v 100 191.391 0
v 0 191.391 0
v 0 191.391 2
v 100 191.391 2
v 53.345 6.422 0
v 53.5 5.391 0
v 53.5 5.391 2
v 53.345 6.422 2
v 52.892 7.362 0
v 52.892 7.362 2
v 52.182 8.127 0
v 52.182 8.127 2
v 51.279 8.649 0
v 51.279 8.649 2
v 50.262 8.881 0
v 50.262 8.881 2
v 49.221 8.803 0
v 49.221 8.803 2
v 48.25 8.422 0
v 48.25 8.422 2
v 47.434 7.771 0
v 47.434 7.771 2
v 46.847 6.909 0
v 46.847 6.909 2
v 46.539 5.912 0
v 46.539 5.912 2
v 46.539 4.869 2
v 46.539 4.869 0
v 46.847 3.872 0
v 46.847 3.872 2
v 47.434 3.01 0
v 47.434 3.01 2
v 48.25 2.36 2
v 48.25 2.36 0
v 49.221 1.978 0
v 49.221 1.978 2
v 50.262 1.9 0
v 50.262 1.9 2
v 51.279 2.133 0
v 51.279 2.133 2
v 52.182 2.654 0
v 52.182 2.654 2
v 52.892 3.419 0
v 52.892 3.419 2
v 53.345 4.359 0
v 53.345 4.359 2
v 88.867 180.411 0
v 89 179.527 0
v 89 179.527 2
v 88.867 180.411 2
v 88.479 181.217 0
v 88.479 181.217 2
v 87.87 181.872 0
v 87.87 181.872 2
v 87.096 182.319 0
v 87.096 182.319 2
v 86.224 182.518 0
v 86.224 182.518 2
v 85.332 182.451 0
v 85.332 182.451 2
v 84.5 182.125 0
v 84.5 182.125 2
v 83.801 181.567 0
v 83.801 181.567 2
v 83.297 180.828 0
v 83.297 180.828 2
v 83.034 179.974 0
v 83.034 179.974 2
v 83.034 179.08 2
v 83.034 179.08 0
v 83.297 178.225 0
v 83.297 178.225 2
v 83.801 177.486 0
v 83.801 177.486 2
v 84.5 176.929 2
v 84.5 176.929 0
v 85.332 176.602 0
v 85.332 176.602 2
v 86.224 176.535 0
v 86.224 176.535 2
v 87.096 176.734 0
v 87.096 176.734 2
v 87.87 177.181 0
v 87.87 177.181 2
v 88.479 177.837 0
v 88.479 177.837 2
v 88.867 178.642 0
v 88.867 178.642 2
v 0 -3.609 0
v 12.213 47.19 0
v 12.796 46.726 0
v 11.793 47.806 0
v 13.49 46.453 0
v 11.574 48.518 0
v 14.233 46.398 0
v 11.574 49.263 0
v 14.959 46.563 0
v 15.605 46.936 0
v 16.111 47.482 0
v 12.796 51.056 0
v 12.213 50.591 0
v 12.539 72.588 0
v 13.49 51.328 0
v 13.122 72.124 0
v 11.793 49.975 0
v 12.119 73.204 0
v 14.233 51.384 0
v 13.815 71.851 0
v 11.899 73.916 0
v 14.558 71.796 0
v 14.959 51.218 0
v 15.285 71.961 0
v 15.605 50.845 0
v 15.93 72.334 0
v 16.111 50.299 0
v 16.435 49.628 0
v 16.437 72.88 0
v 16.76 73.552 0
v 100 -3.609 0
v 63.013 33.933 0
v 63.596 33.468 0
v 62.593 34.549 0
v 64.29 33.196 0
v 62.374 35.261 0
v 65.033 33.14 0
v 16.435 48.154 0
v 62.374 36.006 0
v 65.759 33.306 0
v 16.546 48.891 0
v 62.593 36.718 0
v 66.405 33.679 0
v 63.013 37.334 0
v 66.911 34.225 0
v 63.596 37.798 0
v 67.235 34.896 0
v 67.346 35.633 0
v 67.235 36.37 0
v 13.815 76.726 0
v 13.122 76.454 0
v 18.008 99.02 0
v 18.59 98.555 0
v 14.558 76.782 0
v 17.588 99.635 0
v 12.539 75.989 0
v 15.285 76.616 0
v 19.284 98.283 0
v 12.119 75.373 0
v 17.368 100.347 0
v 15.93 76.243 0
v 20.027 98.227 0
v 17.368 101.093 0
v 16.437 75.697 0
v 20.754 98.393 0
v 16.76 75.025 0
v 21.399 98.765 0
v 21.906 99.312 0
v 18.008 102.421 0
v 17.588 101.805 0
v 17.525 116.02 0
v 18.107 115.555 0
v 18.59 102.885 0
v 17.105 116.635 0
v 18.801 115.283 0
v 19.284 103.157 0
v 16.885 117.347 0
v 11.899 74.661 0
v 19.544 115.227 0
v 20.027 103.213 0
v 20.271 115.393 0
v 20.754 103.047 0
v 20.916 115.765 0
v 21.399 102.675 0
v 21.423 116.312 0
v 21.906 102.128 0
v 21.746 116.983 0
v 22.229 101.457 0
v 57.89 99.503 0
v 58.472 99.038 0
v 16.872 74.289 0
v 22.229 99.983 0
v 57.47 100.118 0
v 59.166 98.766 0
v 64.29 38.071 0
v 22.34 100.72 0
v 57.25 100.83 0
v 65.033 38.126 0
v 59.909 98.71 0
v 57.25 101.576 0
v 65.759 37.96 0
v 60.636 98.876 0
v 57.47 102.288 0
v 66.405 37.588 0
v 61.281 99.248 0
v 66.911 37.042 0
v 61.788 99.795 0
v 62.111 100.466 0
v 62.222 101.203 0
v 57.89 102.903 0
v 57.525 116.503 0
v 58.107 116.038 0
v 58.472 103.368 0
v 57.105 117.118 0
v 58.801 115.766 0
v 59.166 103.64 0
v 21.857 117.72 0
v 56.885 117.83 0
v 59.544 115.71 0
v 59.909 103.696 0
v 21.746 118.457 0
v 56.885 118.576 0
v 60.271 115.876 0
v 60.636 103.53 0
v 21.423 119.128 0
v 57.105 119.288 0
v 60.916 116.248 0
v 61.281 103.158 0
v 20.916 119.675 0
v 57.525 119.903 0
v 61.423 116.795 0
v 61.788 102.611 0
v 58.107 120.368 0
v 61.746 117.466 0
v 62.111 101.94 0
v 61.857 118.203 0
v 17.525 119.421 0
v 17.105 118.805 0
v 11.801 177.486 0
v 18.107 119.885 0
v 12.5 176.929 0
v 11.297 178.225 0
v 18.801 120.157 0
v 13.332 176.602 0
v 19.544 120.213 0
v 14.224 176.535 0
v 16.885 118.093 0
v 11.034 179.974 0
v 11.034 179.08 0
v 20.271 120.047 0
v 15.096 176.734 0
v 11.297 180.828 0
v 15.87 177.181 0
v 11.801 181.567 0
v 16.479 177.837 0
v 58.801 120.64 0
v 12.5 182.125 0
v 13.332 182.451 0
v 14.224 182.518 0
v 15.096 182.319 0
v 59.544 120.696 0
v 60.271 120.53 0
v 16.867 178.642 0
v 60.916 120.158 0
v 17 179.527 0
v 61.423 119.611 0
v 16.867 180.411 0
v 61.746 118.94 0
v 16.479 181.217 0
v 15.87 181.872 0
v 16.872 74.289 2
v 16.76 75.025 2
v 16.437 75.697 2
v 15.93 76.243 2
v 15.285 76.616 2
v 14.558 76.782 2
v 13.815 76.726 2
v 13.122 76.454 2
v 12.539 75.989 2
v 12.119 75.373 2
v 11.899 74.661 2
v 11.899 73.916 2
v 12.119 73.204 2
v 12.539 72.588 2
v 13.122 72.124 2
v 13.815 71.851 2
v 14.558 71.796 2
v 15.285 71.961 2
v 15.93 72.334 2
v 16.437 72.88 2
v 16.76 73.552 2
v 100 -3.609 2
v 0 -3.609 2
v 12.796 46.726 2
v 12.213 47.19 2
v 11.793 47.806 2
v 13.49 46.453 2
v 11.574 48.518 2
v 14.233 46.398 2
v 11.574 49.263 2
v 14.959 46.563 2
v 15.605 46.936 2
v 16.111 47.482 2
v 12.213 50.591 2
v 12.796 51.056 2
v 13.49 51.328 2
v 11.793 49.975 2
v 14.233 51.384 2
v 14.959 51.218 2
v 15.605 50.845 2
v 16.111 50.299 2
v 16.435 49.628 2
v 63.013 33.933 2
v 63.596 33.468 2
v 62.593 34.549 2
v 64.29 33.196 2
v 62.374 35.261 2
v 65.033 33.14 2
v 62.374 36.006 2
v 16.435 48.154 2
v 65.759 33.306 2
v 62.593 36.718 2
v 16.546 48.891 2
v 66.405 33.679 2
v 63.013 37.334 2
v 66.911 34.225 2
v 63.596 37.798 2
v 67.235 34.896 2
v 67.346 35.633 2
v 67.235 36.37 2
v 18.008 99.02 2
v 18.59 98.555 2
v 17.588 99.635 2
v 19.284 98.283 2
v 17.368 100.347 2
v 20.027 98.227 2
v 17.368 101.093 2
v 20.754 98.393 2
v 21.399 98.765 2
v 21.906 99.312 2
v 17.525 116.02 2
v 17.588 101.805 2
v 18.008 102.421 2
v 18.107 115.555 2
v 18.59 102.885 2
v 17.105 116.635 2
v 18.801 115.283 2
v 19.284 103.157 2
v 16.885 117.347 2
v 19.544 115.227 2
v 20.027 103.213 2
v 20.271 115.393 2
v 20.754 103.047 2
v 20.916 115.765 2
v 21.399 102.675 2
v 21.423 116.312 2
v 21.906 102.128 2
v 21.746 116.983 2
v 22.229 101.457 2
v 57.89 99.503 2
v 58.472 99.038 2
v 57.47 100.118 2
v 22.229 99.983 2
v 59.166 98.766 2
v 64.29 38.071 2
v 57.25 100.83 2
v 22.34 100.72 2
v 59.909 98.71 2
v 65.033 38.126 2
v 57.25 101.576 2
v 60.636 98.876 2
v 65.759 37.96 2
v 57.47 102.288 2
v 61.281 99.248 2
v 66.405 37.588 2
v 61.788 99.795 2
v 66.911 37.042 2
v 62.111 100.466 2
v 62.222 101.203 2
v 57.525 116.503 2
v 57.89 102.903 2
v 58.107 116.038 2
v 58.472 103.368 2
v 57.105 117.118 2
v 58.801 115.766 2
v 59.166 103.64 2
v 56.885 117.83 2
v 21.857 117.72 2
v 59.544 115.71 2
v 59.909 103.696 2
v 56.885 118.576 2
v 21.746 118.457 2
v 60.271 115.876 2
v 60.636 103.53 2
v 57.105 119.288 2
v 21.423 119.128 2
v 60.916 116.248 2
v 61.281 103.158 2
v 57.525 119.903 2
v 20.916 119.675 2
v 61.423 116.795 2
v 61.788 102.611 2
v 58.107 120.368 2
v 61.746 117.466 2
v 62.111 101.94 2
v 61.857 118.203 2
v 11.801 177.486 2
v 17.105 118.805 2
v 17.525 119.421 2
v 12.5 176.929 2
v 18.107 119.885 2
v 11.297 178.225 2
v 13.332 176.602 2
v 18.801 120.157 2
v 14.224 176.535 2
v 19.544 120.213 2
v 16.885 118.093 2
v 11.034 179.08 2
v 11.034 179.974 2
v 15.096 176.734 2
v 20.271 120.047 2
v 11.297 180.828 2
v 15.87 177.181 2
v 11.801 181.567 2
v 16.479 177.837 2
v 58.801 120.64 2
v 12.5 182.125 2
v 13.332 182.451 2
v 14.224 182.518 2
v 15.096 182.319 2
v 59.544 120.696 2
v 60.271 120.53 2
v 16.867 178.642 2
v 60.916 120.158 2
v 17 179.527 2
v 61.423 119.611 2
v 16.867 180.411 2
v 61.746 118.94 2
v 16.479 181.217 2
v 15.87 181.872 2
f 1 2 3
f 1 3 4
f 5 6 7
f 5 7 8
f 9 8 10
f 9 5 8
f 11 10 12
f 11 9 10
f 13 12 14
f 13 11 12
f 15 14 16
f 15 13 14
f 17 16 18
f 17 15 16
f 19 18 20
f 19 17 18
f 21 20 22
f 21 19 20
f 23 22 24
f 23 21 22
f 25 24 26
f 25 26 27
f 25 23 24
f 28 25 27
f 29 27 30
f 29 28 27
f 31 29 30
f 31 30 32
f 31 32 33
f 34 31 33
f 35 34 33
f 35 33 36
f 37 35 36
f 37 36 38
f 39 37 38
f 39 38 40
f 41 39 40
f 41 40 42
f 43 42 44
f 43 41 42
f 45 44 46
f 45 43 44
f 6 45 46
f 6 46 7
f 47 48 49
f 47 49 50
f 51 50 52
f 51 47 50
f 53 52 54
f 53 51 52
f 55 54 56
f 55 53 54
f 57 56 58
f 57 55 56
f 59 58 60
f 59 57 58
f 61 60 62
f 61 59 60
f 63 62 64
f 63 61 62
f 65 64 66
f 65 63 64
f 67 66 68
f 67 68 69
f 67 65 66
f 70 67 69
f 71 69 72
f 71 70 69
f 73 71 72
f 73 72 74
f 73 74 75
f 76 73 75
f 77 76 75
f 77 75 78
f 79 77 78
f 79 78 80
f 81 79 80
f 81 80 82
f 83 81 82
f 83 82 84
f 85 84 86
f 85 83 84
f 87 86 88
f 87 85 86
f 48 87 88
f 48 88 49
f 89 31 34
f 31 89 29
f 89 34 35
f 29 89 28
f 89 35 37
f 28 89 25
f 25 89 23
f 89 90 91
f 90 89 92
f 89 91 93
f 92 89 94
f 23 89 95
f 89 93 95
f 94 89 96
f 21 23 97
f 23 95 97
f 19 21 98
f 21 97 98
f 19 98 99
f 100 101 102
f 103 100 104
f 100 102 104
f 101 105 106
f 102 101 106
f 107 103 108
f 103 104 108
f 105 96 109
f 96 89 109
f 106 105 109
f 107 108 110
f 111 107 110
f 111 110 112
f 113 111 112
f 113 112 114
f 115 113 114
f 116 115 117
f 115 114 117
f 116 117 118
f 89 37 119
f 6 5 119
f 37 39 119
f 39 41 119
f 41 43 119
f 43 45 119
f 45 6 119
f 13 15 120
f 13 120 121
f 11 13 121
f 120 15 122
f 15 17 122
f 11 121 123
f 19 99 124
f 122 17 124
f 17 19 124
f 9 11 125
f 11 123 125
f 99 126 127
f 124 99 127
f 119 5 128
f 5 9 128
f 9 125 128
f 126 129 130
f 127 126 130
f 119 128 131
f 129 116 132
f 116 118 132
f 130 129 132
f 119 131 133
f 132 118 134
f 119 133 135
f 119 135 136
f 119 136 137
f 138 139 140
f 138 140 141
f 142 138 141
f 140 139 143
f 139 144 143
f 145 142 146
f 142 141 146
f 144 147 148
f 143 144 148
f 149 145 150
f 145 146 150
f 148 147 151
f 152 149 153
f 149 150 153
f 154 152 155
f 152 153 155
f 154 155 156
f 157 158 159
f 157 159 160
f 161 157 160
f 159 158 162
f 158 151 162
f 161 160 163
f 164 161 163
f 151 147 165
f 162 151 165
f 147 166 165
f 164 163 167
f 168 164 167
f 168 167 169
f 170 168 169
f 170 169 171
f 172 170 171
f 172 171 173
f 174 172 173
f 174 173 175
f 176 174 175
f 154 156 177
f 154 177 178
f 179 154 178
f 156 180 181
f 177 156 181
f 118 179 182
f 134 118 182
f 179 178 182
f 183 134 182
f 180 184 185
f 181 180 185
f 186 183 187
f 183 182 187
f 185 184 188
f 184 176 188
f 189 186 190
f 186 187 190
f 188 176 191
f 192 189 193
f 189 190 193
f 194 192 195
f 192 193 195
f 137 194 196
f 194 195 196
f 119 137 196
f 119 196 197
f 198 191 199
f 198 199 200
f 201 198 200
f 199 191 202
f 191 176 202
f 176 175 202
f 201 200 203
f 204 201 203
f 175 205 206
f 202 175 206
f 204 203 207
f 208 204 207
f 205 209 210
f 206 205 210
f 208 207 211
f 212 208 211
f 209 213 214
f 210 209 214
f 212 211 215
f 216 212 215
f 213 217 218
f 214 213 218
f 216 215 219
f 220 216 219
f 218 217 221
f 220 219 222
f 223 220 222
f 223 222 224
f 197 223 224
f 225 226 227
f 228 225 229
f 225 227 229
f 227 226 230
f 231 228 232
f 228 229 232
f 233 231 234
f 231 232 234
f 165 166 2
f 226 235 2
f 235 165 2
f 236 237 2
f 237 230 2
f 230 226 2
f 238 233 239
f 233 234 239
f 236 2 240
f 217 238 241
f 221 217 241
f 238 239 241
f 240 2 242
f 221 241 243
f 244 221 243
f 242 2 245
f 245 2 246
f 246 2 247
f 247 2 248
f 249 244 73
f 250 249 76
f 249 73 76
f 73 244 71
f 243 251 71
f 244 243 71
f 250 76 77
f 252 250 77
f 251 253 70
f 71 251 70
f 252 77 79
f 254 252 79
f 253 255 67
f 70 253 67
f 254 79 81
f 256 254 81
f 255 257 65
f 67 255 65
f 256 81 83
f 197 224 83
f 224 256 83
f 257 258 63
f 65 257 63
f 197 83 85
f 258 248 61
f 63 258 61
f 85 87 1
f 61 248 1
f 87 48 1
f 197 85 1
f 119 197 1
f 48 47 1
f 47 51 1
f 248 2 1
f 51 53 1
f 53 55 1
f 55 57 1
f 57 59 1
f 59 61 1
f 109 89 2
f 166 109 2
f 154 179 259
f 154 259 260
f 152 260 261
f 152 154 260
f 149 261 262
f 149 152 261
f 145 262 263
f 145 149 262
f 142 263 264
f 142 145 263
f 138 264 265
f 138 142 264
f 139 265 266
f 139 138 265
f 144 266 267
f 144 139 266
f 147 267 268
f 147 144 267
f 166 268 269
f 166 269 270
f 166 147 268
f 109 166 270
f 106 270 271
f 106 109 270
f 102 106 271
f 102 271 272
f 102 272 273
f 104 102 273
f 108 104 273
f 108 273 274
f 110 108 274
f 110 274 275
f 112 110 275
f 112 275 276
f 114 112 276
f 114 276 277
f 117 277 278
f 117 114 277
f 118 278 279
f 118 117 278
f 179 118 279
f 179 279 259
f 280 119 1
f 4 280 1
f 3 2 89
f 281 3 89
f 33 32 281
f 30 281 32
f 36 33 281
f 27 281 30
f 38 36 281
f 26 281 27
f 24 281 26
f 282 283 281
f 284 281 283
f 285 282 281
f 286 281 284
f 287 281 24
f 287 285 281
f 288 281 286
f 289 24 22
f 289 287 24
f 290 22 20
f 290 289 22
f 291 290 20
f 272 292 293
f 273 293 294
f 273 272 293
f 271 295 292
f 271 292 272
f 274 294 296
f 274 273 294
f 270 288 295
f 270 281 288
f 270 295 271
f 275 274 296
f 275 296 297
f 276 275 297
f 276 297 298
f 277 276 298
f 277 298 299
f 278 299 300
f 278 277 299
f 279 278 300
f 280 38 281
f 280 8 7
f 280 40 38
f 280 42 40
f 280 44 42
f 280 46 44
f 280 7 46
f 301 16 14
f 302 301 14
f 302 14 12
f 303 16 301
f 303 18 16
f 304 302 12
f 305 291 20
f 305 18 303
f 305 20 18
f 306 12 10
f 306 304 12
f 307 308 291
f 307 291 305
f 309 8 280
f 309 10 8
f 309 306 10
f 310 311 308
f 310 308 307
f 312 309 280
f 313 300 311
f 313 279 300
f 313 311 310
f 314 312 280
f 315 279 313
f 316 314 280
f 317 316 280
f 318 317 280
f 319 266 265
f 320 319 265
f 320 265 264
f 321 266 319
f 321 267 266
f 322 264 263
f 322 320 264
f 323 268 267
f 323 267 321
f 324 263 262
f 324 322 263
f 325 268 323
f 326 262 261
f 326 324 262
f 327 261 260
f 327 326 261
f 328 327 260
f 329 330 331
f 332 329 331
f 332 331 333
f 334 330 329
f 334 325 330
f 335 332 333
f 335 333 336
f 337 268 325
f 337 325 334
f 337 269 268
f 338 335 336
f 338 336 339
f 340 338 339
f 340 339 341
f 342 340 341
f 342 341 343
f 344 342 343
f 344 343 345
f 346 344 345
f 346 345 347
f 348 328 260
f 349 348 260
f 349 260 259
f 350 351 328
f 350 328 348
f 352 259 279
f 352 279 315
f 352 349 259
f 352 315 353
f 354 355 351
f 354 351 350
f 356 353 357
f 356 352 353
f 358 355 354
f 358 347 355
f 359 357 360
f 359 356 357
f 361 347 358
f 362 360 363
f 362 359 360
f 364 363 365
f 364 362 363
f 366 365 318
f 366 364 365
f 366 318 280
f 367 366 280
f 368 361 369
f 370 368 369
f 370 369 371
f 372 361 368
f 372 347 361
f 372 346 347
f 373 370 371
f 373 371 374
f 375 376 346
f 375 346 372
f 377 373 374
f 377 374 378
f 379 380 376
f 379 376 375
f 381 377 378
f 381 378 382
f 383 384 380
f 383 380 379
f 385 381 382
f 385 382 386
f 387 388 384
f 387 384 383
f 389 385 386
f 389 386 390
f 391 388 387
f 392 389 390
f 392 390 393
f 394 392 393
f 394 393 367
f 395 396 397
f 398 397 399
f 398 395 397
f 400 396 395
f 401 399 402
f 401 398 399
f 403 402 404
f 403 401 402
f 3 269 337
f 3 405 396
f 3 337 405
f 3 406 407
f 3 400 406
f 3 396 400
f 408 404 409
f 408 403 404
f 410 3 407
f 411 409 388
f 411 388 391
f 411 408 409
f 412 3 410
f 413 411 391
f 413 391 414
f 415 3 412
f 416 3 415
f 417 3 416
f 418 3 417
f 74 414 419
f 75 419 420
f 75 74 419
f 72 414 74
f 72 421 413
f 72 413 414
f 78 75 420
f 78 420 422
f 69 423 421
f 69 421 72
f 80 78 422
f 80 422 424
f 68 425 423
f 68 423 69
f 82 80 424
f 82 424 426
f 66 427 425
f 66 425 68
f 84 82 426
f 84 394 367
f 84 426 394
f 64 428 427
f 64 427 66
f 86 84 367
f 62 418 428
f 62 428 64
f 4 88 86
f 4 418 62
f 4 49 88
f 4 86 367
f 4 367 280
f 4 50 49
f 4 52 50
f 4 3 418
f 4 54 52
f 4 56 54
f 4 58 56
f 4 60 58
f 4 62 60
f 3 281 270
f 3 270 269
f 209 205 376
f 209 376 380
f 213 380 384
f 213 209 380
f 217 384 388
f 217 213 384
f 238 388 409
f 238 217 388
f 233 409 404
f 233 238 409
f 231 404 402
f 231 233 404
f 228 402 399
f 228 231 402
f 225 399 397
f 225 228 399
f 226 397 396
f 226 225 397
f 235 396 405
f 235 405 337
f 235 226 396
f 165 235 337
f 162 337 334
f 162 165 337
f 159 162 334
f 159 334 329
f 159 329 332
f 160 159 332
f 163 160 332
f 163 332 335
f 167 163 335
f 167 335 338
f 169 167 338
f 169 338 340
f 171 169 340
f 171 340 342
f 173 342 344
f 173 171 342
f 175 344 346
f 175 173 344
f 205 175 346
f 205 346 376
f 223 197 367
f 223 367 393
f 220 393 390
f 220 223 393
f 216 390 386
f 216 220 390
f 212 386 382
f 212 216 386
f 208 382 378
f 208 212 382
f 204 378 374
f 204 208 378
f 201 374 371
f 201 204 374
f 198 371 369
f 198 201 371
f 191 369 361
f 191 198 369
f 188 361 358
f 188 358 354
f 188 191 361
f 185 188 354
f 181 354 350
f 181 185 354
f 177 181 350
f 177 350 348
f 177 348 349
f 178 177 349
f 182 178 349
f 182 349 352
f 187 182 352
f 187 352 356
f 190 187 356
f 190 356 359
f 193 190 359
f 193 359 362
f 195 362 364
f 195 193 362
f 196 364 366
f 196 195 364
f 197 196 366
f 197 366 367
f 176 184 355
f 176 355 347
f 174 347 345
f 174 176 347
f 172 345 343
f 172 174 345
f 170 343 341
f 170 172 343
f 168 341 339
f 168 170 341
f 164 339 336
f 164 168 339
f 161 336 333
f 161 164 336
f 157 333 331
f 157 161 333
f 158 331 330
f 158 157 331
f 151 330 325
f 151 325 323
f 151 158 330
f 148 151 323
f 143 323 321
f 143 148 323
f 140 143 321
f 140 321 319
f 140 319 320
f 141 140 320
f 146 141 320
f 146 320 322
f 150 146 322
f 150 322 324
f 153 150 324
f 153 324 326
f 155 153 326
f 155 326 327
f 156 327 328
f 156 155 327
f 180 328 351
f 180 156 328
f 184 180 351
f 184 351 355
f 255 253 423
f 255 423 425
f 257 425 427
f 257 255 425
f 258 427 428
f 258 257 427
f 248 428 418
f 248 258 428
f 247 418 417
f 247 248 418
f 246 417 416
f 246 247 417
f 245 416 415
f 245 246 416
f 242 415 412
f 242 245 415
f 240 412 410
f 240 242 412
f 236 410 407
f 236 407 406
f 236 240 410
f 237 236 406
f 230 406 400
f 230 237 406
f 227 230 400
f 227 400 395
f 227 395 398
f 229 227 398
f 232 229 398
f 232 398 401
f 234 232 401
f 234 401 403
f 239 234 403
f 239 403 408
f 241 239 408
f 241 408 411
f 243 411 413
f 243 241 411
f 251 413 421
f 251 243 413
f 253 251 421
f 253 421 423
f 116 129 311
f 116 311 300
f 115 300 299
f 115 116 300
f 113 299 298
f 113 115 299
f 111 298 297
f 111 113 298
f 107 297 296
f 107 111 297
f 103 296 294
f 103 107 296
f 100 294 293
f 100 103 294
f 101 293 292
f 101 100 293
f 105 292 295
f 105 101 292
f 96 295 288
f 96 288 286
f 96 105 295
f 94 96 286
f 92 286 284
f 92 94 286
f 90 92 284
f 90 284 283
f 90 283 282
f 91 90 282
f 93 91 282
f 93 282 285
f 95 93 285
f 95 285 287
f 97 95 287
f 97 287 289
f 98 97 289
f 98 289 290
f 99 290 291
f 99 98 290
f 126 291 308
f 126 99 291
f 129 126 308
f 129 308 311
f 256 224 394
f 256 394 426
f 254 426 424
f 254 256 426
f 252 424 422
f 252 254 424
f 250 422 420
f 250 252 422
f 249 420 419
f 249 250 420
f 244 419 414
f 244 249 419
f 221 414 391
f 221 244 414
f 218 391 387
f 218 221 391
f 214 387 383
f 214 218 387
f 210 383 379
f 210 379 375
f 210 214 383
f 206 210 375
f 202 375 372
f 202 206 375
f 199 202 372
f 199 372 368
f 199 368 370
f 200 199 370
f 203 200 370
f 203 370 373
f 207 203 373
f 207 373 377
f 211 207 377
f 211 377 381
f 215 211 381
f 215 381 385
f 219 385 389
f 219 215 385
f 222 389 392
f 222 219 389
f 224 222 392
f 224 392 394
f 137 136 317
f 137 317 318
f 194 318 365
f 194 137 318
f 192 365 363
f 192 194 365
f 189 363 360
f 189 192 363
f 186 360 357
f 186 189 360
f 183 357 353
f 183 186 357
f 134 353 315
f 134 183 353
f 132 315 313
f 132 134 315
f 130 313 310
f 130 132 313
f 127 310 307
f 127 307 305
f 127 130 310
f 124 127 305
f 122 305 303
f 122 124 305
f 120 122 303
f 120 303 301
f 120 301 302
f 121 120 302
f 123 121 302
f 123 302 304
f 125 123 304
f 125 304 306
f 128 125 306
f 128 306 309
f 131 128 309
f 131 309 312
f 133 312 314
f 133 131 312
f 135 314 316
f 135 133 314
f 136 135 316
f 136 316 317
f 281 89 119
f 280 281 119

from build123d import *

# Parameters (mm, degrees)
F0_W     = 100
F0_H     = 30
F0_R     = 3.5
F0_H_2   = 100
F0_R_2   = 2.5
F0_H_3   = 65
F0_R_3   = 3
F1_DEPTH = 2


with BuildPart() as f1:
    # F0 (on Top) → F1 (new body)
    with BuildSketch(Plane.XY):
        with Locations((50, 11.390658)):
            Rectangle(F0_W, F0_H)
        with Locations((50, 5.390658)):
            Circle(F0_R, mode=Mode.SUBTRACT)
        with Locations((50, 76.390658)):
            Rectangle(F0_W, F0_H_2)
        with Locations((14.045889, 48.890658)):
            Circle(F0_R_2, mode=Mode.SUBTRACT)
        with Locations((14.371501, 74.288571)):
            Circle(F0_R_2, mode=Mode.SUBTRACT)
        with Locations((64.845889, 35.633259)):
            Circle(F0_R_2, mode=Mode.SUBTRACT)
        with Locations((19.840248, 100.720075)):
            Circle(F0_R_2, mode=Mode.SUBTRACT)
        with Locations((19.357387, 117.720075)):
            Circle(F0_R_2, mode=Mode.SUBTRACT)
        with Locations((59.722181, 101.20294)):
            Circle(F0_R_2, mode=Mode.SUBTRACT)
        with Locations((59.357387, 118.20294)):
            Circle(F0_R_2, mode=Mode.SUBTRACT)
        with Locations((50, 158.890658)):
            Rectangle(F0_W, F0_H_3)
        with Locations((14, 179.526627)):
            Circle(F0_R_3, mode=Mode.SUBTRACT)
        with Locations((86, 179.526627)):
            Circle(F0_R_3, mode=Mode.SUBTRACT)
    extrude(amount=F1_DEPTH)


solid = f1.part
